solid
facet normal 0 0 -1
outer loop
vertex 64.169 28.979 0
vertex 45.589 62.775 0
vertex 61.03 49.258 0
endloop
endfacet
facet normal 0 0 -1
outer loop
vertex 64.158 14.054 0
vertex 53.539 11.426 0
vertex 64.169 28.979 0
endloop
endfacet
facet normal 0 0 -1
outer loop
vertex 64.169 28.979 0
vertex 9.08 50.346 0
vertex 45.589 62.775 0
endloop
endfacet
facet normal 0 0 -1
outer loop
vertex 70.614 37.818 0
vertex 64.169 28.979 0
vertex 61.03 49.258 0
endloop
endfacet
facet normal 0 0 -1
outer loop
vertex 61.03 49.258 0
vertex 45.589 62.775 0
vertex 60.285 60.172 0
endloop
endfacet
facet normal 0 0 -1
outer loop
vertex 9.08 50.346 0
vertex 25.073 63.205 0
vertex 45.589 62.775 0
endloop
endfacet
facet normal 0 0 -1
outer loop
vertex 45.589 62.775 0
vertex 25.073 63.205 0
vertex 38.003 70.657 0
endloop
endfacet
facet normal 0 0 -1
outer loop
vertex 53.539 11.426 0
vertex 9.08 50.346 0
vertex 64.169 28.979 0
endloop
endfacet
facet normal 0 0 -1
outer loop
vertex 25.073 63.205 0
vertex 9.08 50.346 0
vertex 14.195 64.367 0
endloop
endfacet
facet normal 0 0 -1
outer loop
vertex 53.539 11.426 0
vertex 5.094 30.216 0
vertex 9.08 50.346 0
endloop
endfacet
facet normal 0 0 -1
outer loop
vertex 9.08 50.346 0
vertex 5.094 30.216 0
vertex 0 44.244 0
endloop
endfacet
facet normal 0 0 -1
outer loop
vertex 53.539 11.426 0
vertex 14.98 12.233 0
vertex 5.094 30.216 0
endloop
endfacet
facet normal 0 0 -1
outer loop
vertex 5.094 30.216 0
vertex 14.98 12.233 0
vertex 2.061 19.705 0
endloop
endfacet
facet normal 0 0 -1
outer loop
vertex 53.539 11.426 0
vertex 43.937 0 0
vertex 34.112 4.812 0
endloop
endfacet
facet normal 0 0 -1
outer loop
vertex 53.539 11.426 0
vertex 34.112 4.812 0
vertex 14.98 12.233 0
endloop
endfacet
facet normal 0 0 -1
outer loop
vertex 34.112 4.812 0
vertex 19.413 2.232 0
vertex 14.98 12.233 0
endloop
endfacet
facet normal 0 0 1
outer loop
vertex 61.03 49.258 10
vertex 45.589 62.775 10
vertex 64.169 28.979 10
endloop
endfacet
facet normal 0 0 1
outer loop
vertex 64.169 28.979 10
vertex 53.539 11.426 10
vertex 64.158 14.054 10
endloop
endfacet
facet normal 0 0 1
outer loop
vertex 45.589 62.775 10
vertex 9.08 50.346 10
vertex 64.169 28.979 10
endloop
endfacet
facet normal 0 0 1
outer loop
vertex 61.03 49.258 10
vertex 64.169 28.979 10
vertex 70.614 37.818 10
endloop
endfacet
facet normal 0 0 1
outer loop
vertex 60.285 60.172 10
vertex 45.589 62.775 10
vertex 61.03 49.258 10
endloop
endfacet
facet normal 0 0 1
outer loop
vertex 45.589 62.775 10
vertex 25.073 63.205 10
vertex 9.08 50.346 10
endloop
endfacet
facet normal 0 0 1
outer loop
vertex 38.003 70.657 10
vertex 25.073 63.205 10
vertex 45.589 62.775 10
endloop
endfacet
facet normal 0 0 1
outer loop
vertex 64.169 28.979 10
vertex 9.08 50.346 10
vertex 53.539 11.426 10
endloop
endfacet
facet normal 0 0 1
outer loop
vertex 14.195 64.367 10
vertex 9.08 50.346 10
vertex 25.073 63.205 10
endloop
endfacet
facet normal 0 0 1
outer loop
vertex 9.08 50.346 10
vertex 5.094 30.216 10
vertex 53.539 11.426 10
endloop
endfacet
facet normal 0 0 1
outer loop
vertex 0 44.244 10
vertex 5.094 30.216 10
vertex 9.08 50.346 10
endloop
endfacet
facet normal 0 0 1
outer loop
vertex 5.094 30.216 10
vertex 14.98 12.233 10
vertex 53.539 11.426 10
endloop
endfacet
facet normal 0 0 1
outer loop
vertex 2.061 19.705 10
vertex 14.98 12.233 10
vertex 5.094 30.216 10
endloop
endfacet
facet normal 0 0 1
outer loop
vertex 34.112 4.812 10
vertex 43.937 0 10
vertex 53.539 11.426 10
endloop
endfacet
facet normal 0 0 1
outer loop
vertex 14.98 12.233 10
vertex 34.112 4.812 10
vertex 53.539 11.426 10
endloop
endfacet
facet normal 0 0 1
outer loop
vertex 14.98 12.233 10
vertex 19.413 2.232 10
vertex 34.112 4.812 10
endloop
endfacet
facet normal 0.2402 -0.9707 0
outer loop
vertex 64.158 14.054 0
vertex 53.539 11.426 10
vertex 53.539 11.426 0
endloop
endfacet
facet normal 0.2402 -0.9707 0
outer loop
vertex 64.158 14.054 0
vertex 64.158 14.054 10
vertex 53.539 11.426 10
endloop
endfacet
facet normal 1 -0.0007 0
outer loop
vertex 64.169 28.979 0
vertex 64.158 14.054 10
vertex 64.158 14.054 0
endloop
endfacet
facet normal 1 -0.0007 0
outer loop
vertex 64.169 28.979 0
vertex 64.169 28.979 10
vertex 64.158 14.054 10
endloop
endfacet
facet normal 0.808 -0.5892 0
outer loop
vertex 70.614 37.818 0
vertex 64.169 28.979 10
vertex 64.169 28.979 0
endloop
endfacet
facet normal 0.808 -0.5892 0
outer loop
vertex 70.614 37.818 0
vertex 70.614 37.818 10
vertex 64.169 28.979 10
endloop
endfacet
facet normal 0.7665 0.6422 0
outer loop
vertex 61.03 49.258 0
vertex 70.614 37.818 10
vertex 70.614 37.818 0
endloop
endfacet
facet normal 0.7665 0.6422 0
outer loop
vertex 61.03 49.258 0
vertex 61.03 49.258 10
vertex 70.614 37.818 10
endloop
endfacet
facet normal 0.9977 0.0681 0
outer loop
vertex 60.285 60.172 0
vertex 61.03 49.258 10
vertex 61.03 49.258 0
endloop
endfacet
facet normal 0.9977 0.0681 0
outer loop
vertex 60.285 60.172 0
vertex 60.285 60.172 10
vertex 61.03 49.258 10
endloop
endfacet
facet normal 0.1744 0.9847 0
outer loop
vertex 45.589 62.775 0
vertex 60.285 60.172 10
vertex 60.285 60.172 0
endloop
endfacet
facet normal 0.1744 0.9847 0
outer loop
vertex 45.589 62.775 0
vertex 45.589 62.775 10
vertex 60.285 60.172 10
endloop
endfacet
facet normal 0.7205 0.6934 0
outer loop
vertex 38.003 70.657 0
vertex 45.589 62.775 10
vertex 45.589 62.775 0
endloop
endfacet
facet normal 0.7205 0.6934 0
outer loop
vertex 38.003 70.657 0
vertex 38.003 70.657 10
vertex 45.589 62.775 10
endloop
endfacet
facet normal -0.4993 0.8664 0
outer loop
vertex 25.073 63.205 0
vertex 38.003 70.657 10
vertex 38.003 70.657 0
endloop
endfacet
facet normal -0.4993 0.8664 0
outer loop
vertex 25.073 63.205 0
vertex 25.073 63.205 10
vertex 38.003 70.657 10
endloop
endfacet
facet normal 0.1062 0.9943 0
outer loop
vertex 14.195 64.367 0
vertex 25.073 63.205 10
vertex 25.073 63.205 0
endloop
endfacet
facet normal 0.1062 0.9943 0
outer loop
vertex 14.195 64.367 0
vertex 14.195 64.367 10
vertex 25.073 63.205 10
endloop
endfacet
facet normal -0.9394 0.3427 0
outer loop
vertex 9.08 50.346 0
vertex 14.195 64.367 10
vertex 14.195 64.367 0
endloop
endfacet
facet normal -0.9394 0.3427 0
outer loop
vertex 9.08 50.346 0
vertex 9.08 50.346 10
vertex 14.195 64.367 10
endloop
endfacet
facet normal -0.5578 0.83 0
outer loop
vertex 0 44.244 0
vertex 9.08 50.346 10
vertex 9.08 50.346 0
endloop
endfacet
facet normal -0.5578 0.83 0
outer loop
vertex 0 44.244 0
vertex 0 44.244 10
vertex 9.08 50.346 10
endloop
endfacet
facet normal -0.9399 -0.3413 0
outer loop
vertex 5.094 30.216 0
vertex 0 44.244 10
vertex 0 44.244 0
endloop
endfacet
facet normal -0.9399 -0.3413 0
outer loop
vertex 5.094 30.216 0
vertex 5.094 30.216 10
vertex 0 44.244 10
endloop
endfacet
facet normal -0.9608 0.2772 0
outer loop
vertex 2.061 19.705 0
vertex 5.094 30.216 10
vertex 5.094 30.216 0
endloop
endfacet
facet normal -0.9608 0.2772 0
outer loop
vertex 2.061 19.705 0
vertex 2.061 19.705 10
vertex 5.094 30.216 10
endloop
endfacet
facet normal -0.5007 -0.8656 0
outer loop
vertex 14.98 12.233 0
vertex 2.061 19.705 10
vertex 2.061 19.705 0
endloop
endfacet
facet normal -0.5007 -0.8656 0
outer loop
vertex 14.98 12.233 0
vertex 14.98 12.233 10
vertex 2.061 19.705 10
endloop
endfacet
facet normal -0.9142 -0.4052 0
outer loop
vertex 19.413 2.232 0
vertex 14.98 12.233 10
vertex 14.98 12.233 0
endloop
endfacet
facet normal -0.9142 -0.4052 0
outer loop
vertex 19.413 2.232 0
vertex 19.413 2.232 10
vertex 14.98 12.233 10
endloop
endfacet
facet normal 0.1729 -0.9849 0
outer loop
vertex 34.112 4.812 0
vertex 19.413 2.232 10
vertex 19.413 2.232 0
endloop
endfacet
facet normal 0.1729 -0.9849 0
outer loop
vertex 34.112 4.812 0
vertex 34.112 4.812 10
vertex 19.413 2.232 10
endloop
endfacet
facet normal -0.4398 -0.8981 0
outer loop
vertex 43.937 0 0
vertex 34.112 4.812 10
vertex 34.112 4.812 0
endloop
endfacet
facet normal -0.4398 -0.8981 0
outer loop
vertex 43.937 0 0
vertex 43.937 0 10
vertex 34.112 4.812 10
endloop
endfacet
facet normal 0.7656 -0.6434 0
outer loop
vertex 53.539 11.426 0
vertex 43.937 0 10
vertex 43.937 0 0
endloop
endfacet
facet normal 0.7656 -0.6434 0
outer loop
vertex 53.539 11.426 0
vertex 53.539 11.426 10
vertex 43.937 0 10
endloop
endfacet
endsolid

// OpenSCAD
$fn = 32;

// ----------------------------------------------------------------------
// Chain sprocket: 9 teeth, 30 mm root radius
// ----------------------------------------------------------------------

// --- parameters (mm) ---
profile_height = 10;      // extrusion height
profile_points = 18;      // points of the closed outline

profile = [[64.169, 28.979], [70.614, 37.818], [61.03, 49.258], [60.285, 60.172], [45.589, 62.775], [38.003, 70.657], [25.073, 63.205], [14.195, 64.367], [9.08, 50.346], [0, 44.244], [5.094, 30.216], [2.061, 19.705], [14.98, 12.233], [19.413, 2.232], [34.112, 4.812], [43.937, 0], [53.539, 11.426], [64.158, 14.054]];  // single closed polygon, 18 points, counter clockwise

// --- the one profile operation ---
linear_extrude(height = profile_height) polygon(points = profile);
